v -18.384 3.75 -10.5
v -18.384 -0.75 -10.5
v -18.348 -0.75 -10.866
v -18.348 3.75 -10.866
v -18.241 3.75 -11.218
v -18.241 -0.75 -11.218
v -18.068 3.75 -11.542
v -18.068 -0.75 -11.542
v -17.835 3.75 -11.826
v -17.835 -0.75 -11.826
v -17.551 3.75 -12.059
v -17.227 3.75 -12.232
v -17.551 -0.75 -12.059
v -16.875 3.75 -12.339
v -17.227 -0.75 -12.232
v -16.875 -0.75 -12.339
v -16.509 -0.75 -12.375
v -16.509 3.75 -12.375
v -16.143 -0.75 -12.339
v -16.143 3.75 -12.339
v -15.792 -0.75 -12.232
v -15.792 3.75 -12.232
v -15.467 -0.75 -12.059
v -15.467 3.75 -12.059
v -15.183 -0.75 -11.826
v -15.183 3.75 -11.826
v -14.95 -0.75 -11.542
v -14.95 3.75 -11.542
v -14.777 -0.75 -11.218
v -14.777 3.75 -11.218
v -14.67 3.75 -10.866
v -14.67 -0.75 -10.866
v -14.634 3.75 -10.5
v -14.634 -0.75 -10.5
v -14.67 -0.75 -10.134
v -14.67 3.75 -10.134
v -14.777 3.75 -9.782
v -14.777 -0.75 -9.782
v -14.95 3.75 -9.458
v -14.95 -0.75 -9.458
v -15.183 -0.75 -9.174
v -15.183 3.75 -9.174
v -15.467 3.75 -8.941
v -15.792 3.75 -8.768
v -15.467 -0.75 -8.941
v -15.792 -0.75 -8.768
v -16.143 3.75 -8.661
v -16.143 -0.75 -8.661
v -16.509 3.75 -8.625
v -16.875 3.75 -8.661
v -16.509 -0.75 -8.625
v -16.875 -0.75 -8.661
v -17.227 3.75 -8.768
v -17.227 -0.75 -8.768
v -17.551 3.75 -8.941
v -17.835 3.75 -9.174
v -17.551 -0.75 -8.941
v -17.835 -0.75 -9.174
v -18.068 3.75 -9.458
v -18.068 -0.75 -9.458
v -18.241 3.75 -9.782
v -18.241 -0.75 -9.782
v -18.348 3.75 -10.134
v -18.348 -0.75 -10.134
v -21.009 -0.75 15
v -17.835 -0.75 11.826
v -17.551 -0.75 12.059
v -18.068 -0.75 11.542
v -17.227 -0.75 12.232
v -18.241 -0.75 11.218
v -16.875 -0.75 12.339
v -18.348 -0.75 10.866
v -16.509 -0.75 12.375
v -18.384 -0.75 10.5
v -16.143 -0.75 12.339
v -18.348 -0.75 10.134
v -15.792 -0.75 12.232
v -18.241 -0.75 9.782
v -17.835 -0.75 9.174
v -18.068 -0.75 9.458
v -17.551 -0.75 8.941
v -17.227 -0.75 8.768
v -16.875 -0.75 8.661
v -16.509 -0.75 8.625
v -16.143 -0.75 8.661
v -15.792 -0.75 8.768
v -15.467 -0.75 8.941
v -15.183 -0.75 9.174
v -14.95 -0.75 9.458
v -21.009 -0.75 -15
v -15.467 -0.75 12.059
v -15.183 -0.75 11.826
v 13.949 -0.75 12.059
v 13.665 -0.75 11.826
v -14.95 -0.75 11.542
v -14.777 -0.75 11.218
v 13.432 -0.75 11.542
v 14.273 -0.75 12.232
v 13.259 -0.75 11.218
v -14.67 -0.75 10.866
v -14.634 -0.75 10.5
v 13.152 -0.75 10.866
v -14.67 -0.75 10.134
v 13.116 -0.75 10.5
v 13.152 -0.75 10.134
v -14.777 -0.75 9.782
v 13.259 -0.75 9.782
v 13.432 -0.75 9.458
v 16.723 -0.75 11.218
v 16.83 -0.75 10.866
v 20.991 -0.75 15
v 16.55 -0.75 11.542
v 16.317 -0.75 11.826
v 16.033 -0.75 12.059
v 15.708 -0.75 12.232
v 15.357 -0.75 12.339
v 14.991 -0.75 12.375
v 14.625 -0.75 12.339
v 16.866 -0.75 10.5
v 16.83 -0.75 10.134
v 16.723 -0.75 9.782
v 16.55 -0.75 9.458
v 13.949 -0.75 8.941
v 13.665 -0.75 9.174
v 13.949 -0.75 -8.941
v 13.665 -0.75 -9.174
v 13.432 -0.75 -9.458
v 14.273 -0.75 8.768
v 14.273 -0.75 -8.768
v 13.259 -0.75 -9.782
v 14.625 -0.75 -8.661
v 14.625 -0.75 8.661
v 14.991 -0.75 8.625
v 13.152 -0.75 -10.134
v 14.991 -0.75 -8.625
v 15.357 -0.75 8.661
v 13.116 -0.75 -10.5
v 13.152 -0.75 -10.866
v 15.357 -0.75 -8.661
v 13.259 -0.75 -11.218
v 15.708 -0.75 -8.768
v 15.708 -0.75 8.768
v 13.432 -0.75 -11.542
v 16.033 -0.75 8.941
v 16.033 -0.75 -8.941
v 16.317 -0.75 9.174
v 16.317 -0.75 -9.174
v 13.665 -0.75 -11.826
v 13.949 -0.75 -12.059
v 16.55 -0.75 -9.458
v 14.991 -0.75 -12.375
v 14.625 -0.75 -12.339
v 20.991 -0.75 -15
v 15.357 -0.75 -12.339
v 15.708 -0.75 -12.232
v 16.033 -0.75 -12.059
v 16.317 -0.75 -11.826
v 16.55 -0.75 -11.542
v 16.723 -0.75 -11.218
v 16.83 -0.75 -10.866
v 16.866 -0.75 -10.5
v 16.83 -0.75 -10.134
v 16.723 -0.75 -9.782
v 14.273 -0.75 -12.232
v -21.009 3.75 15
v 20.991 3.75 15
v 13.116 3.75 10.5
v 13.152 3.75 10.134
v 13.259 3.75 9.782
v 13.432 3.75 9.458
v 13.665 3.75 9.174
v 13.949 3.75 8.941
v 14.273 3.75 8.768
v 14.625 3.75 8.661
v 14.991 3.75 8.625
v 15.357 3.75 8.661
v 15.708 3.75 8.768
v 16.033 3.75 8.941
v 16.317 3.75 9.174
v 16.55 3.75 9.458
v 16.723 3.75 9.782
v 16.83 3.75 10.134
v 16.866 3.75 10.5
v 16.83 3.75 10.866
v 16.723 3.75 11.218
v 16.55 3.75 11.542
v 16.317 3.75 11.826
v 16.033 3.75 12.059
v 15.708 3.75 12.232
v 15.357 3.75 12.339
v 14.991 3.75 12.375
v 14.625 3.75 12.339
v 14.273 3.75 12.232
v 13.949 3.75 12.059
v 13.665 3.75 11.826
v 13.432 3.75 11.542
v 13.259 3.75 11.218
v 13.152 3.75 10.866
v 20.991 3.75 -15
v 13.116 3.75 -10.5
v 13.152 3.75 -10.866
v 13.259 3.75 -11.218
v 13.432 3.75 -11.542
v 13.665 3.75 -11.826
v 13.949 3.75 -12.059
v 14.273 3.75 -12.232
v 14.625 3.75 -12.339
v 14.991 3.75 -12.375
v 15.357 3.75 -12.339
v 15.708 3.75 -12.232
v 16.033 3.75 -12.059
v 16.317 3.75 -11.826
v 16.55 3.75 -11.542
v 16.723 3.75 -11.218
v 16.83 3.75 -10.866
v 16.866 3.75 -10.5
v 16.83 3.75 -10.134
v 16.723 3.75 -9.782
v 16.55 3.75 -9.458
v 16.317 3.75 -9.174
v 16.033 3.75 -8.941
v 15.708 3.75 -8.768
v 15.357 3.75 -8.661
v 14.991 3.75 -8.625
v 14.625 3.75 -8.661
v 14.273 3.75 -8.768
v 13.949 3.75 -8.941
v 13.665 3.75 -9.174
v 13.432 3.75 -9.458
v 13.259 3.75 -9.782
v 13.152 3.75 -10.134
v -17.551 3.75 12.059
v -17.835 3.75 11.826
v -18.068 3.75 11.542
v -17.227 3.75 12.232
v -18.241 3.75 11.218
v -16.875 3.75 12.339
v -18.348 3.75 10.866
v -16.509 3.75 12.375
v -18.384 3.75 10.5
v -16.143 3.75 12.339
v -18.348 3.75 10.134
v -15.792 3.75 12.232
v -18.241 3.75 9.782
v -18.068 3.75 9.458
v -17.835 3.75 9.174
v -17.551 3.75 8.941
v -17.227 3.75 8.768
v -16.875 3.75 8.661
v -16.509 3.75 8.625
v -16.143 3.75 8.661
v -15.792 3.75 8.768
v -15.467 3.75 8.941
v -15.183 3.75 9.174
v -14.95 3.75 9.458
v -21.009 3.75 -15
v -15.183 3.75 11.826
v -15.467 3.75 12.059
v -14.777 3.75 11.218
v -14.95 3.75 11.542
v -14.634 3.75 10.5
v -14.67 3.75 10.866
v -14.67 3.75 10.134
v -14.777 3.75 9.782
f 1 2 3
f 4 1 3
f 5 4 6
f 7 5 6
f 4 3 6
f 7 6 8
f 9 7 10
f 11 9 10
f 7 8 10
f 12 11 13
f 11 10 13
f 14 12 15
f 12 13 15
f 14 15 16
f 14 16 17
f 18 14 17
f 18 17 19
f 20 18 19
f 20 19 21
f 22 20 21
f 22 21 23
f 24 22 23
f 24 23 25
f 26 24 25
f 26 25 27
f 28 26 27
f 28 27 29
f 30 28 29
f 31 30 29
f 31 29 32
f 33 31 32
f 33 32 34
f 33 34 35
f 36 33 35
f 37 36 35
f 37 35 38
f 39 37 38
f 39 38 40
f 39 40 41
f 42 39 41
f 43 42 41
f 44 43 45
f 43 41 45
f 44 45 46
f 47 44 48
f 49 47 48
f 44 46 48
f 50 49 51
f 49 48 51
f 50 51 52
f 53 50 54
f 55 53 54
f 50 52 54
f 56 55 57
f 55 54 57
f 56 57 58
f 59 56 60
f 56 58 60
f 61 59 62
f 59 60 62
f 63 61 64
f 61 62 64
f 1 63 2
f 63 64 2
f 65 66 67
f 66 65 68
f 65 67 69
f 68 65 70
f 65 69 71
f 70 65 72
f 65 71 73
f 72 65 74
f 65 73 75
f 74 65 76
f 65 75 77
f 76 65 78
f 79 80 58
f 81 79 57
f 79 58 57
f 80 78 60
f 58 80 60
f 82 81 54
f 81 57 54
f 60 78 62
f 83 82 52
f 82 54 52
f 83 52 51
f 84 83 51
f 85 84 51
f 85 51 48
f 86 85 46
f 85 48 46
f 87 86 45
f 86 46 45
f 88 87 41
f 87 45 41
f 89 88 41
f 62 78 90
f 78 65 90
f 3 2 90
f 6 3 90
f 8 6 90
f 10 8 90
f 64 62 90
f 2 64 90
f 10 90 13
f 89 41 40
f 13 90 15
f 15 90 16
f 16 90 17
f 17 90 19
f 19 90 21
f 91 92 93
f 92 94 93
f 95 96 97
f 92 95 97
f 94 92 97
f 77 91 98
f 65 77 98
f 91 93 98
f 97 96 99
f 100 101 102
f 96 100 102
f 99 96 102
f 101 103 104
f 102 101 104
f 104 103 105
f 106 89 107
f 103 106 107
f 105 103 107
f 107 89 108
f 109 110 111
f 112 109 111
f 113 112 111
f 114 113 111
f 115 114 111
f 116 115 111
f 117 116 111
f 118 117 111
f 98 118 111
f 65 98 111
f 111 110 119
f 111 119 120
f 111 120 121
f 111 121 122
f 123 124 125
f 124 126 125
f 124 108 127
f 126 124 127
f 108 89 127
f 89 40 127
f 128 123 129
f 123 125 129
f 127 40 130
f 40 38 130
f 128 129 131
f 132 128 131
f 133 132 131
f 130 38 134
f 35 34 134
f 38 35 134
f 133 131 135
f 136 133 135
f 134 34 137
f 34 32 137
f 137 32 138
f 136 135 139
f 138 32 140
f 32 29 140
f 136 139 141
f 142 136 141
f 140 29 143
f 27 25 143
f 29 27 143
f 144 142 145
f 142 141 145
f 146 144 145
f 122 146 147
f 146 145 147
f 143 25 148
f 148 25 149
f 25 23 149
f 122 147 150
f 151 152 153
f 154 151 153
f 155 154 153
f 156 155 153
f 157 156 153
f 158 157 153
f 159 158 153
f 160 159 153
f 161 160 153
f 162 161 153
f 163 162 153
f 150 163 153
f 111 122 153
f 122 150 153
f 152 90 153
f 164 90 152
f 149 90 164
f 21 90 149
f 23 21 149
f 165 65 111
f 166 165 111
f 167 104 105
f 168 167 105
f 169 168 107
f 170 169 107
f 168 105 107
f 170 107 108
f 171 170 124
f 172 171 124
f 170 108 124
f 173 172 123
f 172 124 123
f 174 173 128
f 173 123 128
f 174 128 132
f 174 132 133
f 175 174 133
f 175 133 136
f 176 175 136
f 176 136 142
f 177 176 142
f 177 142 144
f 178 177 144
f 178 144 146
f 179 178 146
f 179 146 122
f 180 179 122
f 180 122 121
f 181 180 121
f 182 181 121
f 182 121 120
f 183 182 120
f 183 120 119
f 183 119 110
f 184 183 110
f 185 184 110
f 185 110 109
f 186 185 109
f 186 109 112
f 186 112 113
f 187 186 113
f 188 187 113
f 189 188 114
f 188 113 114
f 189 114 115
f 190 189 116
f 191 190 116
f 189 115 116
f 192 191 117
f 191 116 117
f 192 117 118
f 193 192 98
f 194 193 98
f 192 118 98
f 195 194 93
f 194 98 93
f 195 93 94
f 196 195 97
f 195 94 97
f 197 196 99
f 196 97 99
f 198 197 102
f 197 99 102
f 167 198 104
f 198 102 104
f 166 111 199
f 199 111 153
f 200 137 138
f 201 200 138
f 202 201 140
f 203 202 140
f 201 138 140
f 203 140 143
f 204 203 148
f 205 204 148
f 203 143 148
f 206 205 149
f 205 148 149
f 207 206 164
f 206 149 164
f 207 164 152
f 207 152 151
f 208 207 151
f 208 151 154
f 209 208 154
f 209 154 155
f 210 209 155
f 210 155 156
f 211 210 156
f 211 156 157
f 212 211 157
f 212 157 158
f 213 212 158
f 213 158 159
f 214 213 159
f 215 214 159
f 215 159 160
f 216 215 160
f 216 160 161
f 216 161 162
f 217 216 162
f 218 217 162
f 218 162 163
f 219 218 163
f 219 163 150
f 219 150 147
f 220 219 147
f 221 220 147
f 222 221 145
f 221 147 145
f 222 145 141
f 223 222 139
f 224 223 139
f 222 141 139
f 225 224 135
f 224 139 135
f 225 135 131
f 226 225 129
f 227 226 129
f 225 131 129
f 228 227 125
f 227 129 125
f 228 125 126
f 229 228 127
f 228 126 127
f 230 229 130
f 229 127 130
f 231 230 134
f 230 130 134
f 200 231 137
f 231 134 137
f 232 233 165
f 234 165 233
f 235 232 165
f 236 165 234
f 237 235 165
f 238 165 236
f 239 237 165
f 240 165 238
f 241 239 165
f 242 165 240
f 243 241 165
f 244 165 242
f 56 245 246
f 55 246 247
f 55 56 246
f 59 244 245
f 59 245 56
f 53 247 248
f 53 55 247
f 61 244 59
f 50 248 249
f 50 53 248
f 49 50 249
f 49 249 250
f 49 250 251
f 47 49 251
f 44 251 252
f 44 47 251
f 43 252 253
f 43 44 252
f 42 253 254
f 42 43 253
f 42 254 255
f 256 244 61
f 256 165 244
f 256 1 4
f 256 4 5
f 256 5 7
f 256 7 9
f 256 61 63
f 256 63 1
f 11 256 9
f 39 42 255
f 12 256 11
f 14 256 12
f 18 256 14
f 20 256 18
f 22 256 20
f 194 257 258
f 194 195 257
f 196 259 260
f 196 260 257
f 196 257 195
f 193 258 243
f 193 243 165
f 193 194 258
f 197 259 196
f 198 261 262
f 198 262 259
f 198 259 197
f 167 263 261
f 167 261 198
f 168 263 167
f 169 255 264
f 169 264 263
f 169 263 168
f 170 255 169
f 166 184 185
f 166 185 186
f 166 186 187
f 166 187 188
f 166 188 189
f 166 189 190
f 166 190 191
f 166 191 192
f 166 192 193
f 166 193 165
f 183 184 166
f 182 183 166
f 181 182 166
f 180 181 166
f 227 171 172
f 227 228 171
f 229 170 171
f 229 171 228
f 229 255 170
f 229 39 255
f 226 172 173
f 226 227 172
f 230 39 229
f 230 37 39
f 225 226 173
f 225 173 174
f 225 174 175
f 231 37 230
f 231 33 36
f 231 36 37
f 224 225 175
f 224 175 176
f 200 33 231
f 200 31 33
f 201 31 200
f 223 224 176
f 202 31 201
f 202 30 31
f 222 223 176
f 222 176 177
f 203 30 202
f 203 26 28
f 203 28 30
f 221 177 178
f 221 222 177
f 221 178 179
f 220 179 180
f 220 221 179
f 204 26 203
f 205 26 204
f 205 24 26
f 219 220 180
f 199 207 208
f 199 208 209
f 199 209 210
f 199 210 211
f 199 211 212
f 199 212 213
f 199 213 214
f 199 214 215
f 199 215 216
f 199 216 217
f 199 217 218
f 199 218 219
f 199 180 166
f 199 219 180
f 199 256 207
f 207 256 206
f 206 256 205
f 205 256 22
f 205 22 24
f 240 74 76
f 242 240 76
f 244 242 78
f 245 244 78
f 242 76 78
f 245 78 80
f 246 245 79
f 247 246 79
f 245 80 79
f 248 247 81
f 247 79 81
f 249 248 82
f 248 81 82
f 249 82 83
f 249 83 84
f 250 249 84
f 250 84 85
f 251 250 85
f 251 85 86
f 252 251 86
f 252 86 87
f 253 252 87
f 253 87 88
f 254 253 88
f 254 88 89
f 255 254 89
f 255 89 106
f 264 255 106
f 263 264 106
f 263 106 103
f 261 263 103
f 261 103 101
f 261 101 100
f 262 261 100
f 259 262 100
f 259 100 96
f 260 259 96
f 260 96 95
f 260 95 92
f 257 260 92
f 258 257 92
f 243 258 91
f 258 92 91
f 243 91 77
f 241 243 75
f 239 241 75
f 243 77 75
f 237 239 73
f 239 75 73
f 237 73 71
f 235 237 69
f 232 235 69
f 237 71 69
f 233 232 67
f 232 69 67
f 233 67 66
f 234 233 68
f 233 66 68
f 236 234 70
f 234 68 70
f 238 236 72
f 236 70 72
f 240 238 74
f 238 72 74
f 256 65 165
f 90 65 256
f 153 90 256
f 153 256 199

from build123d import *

# Parameters (mm, degrees)
SKETCH1_W           = 28
SKETCH1_H           = 20
BOSS_EXTRUDE1_DEPTH = 3
M3_TAPPED_HOLE1_D   = 2.5
SCALE1_SCALE        = 1.5


with BuildPart() as part:
    # Sketch1 → Boss-Extrude1 (new body)
    with BuildSketch(Plane(origin=(0, 0, 0), x_dir=(1, 0, 0), z_dir=(0, 1, 0))):
        Rectangle(SKETCH1_W, SKETCH1_H)
    extrude(amount=BOSS_EXTRUDE1_DEPTH)

    # M3 Tapped Hole1 (through all)
    with Locations(Plane(origin=(0, 3, 0), x_dir=(1, 0, 0), z_dir=(0, 1, 0))):
        with Locations((-11, 7), (-11, -7), (10, -7), (10, 7)):
            Hole(M3_TAPPED_HOLE1_D / 2)


with BuildPart() as part_1:
    # Scale1: scaled about (0.018168231, 1.5, 0)
    add(part.part.scale(SCALE1_SCALE).moved(Location((-0.009084115, -0.75, 0))))


solid = part_1.part
